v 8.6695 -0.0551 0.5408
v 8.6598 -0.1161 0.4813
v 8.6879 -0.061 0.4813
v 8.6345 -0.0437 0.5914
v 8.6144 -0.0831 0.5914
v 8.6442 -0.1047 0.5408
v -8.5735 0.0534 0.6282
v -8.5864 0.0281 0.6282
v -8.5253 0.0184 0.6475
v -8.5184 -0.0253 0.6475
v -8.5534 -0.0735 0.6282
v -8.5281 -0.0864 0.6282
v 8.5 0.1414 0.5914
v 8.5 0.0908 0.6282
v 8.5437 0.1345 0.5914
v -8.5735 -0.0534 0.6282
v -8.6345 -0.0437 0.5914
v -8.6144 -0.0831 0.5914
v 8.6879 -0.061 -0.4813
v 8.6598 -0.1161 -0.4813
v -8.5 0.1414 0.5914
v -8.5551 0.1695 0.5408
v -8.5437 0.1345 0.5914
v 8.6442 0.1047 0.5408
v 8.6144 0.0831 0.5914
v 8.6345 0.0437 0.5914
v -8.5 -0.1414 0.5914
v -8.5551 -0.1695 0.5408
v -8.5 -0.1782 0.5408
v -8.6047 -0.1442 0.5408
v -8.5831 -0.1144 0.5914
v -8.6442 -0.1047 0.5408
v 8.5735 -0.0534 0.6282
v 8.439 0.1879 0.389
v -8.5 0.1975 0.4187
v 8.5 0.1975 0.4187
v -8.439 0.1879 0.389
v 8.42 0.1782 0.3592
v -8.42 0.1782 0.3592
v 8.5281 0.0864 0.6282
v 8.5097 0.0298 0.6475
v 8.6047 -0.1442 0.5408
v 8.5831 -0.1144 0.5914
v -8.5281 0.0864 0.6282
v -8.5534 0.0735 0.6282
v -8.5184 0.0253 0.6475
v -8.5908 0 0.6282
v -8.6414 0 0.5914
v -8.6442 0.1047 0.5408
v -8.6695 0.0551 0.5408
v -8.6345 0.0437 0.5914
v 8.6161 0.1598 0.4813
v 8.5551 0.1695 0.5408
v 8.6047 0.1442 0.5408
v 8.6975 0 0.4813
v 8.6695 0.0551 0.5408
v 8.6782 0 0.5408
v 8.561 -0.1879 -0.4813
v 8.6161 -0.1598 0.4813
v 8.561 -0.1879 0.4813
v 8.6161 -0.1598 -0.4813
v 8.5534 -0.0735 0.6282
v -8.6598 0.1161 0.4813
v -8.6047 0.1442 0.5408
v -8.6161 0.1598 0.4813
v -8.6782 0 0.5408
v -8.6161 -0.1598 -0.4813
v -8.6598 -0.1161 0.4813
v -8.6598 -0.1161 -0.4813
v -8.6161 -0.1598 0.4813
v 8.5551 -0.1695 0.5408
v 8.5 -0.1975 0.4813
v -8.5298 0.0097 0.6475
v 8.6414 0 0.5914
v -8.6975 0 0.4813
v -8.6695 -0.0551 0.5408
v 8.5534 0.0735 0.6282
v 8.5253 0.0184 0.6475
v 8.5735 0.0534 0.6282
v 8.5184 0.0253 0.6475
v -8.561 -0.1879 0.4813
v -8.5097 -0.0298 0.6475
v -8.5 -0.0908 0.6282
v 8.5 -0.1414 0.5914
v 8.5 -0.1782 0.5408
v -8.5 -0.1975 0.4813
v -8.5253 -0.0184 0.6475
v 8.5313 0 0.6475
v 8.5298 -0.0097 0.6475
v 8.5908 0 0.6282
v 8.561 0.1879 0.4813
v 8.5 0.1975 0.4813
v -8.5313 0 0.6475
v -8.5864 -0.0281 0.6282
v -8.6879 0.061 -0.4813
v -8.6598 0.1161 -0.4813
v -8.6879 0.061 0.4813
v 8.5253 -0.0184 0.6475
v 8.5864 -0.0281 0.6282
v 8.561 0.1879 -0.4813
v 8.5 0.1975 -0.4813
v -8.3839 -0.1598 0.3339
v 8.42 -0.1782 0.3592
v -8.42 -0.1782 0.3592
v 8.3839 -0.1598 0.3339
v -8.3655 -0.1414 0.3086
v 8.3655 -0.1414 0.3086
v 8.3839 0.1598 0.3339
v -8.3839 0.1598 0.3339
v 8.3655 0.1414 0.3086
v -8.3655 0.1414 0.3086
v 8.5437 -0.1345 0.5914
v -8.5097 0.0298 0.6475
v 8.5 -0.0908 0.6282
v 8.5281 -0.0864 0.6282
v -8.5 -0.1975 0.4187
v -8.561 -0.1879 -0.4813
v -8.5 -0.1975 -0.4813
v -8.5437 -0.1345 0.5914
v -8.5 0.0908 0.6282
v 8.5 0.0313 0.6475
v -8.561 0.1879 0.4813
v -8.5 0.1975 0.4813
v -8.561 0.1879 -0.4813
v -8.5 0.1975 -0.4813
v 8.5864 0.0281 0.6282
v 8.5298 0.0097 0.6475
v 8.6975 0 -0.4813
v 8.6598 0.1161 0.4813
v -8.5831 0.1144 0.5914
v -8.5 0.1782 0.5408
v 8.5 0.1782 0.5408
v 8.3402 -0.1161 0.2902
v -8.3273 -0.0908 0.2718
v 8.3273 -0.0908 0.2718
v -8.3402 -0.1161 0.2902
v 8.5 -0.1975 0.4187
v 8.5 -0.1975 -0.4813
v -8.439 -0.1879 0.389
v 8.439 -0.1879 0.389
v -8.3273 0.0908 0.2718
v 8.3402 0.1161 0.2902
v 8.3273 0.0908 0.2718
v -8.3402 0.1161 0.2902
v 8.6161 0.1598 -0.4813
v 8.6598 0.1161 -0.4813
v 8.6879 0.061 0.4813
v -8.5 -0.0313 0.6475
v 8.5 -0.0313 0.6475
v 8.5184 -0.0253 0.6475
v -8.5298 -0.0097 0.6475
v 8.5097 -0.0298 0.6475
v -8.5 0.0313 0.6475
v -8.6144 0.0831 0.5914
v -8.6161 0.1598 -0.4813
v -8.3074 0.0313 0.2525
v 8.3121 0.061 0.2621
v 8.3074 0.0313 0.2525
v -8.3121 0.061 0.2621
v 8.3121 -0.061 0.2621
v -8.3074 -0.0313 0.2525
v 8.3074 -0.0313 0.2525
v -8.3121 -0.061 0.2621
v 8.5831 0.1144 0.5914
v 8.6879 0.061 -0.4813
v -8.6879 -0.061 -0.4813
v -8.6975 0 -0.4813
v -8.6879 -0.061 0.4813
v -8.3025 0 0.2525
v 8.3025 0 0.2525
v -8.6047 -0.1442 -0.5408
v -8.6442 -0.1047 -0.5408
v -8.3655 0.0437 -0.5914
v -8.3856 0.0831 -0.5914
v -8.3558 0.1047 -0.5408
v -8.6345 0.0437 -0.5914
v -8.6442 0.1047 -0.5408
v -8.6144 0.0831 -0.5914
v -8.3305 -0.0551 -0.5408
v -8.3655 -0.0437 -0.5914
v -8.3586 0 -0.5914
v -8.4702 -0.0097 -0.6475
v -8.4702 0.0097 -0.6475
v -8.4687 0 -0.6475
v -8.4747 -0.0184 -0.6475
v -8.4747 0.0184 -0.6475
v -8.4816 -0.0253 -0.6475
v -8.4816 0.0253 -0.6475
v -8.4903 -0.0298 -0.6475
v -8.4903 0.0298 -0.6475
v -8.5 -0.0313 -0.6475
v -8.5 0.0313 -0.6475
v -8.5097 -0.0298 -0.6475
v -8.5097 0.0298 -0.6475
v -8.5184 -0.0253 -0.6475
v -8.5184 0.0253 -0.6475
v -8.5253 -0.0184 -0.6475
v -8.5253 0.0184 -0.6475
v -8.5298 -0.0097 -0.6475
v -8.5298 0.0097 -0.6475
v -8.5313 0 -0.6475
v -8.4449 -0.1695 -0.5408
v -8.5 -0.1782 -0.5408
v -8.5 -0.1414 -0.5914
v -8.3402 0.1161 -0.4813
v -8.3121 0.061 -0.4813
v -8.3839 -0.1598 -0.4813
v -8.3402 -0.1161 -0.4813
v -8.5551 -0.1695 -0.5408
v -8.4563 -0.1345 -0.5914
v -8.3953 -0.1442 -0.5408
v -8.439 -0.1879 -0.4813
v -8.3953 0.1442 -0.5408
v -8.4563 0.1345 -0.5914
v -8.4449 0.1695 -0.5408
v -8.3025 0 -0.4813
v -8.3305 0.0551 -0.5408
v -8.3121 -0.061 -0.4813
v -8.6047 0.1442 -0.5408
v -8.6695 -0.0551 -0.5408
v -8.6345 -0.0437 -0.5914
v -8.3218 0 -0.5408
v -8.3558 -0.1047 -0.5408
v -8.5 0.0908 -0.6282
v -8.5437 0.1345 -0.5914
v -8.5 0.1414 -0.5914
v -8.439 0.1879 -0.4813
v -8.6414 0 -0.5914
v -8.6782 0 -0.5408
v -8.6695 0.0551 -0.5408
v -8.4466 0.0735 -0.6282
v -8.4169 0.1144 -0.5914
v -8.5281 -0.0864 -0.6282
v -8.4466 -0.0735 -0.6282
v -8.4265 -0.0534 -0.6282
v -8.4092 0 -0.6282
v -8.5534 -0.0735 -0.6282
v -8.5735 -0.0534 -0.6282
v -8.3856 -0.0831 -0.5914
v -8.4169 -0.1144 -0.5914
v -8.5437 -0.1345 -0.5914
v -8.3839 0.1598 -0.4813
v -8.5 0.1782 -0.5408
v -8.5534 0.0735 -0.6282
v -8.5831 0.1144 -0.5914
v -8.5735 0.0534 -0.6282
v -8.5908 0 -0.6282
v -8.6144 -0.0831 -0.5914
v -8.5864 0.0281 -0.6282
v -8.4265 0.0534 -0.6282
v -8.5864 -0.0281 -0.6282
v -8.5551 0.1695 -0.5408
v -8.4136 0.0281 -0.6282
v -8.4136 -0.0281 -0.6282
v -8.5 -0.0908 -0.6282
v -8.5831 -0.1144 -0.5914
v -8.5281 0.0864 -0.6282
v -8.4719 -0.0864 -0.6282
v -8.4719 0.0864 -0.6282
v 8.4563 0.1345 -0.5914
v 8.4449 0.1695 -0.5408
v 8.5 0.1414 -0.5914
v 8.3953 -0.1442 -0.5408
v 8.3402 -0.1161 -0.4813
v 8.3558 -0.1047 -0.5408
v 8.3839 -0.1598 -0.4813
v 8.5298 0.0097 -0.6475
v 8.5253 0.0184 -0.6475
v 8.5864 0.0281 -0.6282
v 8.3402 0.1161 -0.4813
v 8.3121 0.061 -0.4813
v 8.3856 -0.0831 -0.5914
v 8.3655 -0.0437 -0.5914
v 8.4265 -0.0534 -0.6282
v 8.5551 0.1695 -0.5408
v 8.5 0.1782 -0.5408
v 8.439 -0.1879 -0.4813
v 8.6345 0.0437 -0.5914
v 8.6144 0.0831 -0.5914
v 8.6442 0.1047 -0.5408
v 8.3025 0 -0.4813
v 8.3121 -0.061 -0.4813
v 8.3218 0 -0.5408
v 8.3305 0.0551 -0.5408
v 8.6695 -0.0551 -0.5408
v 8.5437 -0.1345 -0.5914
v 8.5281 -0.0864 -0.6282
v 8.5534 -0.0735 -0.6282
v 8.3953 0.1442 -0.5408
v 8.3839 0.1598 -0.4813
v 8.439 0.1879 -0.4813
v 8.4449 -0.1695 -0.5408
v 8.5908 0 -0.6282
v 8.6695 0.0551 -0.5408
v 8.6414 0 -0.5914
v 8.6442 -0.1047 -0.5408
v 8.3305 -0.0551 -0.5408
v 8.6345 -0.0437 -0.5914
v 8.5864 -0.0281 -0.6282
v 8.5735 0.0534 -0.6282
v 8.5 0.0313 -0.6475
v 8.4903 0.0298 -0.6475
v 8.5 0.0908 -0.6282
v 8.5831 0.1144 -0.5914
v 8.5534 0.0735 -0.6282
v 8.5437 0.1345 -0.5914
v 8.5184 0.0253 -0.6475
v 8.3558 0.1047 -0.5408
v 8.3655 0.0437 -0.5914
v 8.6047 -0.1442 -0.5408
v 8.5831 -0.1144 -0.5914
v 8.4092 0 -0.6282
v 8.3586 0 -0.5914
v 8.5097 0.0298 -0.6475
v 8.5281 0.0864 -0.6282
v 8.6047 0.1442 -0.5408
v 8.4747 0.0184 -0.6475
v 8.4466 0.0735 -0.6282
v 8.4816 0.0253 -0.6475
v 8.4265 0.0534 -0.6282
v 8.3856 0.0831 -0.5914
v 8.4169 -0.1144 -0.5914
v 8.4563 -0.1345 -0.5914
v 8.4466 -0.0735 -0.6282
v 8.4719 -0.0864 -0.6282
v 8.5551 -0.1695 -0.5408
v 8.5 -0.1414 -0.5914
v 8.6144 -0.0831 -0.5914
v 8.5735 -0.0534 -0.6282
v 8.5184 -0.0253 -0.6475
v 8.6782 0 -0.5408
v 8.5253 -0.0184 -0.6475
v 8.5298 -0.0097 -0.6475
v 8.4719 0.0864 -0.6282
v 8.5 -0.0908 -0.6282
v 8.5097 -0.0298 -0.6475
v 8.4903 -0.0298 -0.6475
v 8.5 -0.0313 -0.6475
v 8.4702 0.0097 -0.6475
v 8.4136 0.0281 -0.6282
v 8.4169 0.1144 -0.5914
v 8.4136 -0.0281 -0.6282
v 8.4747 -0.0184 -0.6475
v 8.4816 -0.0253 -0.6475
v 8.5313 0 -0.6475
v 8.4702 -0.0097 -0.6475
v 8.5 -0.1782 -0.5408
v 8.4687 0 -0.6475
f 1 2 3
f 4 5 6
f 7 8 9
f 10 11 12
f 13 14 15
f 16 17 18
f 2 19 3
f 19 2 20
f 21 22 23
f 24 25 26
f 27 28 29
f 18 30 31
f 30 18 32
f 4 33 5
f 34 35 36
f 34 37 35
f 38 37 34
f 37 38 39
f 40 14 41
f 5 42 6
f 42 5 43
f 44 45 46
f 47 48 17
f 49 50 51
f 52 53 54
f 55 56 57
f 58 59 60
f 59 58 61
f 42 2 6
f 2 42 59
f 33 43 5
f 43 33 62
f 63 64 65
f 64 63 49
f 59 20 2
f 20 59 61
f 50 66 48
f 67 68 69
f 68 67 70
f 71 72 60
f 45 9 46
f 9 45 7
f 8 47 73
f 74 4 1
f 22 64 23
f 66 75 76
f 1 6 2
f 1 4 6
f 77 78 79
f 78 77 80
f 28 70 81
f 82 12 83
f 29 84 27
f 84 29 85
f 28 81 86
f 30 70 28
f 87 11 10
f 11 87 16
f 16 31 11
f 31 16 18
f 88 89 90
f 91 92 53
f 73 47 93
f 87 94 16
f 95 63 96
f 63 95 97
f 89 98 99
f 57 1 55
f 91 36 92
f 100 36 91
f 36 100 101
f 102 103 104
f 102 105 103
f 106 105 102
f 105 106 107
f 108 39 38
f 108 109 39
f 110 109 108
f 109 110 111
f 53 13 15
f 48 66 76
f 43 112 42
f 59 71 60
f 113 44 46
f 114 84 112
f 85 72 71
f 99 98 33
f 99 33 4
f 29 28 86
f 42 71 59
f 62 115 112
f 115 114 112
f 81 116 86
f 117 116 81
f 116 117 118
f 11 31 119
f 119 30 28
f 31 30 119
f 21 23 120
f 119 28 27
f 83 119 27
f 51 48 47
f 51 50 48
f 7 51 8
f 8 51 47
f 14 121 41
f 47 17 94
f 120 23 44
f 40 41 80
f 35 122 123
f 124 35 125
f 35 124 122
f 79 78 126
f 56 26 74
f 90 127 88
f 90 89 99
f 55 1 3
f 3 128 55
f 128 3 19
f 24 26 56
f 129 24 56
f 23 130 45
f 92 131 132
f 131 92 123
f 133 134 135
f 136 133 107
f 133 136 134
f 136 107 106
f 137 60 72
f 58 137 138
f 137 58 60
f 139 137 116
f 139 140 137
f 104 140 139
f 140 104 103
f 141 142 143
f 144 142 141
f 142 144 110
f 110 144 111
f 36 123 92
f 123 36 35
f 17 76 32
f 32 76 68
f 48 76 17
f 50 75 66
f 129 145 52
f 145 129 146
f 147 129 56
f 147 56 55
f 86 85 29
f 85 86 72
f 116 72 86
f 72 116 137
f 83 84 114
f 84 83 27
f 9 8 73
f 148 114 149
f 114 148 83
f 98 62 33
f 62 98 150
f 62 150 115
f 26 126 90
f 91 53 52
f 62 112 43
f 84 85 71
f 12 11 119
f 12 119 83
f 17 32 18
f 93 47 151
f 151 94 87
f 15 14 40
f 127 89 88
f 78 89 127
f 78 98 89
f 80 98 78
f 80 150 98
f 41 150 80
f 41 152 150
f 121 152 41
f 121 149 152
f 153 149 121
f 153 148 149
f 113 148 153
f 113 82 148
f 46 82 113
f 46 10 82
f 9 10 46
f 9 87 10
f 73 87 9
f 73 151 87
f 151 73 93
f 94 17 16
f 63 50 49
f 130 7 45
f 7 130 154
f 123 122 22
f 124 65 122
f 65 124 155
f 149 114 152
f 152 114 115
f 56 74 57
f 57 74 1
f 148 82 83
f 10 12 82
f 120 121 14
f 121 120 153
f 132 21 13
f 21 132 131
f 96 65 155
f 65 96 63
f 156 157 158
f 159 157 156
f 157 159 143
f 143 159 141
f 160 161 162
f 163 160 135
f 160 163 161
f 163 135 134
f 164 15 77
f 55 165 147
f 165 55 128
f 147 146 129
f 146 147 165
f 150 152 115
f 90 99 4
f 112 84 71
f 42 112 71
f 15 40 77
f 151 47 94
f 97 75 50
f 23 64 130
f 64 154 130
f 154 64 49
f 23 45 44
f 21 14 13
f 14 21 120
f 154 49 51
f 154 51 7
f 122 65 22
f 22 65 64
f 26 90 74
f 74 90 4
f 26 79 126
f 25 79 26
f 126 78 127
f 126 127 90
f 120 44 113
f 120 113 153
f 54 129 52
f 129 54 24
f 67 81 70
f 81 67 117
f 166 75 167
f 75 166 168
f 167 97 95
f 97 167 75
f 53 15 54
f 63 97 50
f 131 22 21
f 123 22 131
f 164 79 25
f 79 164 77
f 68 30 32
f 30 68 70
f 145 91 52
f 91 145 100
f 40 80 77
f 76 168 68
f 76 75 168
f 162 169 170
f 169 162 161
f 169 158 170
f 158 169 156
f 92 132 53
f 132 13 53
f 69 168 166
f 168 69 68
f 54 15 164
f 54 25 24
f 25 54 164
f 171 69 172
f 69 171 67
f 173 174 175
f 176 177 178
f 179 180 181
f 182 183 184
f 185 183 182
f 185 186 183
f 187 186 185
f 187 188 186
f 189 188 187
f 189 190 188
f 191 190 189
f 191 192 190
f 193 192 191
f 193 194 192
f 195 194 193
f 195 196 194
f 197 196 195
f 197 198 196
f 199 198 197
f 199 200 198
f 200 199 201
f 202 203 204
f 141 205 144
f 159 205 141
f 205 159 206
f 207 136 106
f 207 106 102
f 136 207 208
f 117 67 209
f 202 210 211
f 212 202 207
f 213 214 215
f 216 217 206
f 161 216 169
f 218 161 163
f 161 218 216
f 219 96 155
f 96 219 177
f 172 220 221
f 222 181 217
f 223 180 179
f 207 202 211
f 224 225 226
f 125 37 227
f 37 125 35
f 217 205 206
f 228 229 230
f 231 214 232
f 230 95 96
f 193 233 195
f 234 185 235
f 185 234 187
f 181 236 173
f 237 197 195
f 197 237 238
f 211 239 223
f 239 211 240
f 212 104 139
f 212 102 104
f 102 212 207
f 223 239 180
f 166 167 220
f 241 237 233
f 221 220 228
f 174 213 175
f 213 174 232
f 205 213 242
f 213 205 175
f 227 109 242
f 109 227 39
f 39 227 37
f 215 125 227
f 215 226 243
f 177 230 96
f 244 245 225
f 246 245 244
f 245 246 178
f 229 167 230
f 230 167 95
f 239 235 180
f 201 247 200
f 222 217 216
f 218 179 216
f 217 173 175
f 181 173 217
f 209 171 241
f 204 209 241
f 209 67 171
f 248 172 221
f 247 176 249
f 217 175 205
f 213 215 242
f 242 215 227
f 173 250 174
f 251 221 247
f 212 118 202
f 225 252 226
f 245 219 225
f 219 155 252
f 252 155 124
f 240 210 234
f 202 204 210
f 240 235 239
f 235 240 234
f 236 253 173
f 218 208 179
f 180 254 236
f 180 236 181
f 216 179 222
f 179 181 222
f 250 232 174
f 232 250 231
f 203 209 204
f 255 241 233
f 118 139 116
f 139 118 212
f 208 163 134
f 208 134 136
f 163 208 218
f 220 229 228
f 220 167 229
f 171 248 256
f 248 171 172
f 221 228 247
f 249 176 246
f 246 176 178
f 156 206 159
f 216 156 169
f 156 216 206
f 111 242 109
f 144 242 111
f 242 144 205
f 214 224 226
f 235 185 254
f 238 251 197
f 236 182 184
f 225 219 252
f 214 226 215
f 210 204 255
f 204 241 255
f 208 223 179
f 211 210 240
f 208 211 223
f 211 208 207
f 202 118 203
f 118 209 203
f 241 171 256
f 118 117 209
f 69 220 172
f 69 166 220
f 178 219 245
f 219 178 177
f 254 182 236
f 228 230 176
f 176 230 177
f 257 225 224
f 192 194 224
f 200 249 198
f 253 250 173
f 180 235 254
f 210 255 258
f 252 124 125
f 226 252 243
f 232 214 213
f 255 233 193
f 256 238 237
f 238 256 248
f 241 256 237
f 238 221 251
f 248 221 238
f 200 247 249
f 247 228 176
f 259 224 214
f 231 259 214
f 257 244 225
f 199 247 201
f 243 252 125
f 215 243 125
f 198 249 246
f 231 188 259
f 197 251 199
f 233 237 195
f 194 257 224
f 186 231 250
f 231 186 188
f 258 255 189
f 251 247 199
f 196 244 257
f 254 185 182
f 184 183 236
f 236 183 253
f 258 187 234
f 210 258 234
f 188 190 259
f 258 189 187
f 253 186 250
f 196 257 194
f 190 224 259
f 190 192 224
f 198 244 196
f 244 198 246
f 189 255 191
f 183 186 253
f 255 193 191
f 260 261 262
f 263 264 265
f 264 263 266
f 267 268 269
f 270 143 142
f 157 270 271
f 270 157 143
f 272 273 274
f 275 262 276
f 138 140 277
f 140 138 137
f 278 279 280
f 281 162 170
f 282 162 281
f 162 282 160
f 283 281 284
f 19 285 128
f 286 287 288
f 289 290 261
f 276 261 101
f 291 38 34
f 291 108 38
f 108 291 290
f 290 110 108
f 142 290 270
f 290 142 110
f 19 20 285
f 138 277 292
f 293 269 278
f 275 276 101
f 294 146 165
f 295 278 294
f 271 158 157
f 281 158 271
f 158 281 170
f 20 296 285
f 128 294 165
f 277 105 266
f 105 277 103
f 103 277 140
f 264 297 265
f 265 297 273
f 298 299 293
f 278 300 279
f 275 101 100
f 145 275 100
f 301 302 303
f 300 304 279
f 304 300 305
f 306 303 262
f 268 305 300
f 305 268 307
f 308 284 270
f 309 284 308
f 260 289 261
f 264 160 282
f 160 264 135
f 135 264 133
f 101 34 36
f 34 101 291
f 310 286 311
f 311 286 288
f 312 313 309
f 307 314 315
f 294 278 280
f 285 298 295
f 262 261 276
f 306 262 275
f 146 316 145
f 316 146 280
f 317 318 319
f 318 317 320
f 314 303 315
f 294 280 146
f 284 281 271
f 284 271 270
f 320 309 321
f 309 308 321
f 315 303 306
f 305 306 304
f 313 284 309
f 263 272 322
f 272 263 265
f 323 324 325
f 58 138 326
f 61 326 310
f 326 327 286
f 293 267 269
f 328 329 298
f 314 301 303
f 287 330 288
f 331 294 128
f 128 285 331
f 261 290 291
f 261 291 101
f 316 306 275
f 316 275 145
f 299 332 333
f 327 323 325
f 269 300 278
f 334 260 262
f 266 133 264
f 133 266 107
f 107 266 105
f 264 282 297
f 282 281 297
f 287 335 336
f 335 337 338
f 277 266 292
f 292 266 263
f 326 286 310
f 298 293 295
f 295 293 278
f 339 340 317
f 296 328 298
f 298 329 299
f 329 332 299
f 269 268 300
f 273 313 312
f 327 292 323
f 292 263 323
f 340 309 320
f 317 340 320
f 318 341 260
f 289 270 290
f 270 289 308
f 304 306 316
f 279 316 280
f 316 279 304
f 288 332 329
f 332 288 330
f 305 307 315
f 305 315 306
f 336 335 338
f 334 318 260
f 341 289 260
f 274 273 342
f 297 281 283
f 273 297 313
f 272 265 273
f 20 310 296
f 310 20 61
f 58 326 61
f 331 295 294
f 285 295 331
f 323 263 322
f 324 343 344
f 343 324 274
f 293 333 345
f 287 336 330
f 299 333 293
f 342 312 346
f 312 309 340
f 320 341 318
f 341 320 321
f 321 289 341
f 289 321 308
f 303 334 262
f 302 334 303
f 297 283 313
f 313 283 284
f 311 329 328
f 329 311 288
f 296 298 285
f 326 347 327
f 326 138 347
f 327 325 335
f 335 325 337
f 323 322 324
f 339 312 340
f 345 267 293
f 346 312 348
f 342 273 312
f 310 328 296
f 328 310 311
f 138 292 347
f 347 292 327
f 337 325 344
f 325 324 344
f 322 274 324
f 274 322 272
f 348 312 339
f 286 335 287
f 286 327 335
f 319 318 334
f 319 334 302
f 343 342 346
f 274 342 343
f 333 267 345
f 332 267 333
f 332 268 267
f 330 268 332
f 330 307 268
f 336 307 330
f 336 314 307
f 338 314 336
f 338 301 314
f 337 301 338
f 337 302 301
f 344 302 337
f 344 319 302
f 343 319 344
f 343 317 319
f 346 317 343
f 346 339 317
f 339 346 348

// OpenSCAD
// part_id: b15
// name: B15 wire link
// source_drawing_ids: DRW-002
// units: mm
// revision: 0.1
// SPDX-License-Identifier: MIT

module wire_segment(a = [0, 0, 0], b = [10, 0, 0], d = 0.4) {
    hull() {
        translate(a) sphere(d = d, $fn = 20);
        translate(b) sphere(d = d, $fn = 20);
    }
}

module part_b15(run = 17, hook_len = 0.9, wire_d = 0.4) {
    // Planar bent wire with short 90-degree return hooks.
    translate([-run / 2, 0, hook_len / 2])
        union() {
            wire_segment([0, 0, 0], [run, 0, 0], wire_d);
            wire_segment([0, 0, 0], [0, 0, -hook_len], wire_d);
            wire_segment([run, 0, 0], [run, 0, -hook_len], wire_d);
        }
}

// ---- "main guard" ----
// Default to previewing when opened directly:
if (is_undef(__LIB_MODE__)) {
    part_b15();
}
